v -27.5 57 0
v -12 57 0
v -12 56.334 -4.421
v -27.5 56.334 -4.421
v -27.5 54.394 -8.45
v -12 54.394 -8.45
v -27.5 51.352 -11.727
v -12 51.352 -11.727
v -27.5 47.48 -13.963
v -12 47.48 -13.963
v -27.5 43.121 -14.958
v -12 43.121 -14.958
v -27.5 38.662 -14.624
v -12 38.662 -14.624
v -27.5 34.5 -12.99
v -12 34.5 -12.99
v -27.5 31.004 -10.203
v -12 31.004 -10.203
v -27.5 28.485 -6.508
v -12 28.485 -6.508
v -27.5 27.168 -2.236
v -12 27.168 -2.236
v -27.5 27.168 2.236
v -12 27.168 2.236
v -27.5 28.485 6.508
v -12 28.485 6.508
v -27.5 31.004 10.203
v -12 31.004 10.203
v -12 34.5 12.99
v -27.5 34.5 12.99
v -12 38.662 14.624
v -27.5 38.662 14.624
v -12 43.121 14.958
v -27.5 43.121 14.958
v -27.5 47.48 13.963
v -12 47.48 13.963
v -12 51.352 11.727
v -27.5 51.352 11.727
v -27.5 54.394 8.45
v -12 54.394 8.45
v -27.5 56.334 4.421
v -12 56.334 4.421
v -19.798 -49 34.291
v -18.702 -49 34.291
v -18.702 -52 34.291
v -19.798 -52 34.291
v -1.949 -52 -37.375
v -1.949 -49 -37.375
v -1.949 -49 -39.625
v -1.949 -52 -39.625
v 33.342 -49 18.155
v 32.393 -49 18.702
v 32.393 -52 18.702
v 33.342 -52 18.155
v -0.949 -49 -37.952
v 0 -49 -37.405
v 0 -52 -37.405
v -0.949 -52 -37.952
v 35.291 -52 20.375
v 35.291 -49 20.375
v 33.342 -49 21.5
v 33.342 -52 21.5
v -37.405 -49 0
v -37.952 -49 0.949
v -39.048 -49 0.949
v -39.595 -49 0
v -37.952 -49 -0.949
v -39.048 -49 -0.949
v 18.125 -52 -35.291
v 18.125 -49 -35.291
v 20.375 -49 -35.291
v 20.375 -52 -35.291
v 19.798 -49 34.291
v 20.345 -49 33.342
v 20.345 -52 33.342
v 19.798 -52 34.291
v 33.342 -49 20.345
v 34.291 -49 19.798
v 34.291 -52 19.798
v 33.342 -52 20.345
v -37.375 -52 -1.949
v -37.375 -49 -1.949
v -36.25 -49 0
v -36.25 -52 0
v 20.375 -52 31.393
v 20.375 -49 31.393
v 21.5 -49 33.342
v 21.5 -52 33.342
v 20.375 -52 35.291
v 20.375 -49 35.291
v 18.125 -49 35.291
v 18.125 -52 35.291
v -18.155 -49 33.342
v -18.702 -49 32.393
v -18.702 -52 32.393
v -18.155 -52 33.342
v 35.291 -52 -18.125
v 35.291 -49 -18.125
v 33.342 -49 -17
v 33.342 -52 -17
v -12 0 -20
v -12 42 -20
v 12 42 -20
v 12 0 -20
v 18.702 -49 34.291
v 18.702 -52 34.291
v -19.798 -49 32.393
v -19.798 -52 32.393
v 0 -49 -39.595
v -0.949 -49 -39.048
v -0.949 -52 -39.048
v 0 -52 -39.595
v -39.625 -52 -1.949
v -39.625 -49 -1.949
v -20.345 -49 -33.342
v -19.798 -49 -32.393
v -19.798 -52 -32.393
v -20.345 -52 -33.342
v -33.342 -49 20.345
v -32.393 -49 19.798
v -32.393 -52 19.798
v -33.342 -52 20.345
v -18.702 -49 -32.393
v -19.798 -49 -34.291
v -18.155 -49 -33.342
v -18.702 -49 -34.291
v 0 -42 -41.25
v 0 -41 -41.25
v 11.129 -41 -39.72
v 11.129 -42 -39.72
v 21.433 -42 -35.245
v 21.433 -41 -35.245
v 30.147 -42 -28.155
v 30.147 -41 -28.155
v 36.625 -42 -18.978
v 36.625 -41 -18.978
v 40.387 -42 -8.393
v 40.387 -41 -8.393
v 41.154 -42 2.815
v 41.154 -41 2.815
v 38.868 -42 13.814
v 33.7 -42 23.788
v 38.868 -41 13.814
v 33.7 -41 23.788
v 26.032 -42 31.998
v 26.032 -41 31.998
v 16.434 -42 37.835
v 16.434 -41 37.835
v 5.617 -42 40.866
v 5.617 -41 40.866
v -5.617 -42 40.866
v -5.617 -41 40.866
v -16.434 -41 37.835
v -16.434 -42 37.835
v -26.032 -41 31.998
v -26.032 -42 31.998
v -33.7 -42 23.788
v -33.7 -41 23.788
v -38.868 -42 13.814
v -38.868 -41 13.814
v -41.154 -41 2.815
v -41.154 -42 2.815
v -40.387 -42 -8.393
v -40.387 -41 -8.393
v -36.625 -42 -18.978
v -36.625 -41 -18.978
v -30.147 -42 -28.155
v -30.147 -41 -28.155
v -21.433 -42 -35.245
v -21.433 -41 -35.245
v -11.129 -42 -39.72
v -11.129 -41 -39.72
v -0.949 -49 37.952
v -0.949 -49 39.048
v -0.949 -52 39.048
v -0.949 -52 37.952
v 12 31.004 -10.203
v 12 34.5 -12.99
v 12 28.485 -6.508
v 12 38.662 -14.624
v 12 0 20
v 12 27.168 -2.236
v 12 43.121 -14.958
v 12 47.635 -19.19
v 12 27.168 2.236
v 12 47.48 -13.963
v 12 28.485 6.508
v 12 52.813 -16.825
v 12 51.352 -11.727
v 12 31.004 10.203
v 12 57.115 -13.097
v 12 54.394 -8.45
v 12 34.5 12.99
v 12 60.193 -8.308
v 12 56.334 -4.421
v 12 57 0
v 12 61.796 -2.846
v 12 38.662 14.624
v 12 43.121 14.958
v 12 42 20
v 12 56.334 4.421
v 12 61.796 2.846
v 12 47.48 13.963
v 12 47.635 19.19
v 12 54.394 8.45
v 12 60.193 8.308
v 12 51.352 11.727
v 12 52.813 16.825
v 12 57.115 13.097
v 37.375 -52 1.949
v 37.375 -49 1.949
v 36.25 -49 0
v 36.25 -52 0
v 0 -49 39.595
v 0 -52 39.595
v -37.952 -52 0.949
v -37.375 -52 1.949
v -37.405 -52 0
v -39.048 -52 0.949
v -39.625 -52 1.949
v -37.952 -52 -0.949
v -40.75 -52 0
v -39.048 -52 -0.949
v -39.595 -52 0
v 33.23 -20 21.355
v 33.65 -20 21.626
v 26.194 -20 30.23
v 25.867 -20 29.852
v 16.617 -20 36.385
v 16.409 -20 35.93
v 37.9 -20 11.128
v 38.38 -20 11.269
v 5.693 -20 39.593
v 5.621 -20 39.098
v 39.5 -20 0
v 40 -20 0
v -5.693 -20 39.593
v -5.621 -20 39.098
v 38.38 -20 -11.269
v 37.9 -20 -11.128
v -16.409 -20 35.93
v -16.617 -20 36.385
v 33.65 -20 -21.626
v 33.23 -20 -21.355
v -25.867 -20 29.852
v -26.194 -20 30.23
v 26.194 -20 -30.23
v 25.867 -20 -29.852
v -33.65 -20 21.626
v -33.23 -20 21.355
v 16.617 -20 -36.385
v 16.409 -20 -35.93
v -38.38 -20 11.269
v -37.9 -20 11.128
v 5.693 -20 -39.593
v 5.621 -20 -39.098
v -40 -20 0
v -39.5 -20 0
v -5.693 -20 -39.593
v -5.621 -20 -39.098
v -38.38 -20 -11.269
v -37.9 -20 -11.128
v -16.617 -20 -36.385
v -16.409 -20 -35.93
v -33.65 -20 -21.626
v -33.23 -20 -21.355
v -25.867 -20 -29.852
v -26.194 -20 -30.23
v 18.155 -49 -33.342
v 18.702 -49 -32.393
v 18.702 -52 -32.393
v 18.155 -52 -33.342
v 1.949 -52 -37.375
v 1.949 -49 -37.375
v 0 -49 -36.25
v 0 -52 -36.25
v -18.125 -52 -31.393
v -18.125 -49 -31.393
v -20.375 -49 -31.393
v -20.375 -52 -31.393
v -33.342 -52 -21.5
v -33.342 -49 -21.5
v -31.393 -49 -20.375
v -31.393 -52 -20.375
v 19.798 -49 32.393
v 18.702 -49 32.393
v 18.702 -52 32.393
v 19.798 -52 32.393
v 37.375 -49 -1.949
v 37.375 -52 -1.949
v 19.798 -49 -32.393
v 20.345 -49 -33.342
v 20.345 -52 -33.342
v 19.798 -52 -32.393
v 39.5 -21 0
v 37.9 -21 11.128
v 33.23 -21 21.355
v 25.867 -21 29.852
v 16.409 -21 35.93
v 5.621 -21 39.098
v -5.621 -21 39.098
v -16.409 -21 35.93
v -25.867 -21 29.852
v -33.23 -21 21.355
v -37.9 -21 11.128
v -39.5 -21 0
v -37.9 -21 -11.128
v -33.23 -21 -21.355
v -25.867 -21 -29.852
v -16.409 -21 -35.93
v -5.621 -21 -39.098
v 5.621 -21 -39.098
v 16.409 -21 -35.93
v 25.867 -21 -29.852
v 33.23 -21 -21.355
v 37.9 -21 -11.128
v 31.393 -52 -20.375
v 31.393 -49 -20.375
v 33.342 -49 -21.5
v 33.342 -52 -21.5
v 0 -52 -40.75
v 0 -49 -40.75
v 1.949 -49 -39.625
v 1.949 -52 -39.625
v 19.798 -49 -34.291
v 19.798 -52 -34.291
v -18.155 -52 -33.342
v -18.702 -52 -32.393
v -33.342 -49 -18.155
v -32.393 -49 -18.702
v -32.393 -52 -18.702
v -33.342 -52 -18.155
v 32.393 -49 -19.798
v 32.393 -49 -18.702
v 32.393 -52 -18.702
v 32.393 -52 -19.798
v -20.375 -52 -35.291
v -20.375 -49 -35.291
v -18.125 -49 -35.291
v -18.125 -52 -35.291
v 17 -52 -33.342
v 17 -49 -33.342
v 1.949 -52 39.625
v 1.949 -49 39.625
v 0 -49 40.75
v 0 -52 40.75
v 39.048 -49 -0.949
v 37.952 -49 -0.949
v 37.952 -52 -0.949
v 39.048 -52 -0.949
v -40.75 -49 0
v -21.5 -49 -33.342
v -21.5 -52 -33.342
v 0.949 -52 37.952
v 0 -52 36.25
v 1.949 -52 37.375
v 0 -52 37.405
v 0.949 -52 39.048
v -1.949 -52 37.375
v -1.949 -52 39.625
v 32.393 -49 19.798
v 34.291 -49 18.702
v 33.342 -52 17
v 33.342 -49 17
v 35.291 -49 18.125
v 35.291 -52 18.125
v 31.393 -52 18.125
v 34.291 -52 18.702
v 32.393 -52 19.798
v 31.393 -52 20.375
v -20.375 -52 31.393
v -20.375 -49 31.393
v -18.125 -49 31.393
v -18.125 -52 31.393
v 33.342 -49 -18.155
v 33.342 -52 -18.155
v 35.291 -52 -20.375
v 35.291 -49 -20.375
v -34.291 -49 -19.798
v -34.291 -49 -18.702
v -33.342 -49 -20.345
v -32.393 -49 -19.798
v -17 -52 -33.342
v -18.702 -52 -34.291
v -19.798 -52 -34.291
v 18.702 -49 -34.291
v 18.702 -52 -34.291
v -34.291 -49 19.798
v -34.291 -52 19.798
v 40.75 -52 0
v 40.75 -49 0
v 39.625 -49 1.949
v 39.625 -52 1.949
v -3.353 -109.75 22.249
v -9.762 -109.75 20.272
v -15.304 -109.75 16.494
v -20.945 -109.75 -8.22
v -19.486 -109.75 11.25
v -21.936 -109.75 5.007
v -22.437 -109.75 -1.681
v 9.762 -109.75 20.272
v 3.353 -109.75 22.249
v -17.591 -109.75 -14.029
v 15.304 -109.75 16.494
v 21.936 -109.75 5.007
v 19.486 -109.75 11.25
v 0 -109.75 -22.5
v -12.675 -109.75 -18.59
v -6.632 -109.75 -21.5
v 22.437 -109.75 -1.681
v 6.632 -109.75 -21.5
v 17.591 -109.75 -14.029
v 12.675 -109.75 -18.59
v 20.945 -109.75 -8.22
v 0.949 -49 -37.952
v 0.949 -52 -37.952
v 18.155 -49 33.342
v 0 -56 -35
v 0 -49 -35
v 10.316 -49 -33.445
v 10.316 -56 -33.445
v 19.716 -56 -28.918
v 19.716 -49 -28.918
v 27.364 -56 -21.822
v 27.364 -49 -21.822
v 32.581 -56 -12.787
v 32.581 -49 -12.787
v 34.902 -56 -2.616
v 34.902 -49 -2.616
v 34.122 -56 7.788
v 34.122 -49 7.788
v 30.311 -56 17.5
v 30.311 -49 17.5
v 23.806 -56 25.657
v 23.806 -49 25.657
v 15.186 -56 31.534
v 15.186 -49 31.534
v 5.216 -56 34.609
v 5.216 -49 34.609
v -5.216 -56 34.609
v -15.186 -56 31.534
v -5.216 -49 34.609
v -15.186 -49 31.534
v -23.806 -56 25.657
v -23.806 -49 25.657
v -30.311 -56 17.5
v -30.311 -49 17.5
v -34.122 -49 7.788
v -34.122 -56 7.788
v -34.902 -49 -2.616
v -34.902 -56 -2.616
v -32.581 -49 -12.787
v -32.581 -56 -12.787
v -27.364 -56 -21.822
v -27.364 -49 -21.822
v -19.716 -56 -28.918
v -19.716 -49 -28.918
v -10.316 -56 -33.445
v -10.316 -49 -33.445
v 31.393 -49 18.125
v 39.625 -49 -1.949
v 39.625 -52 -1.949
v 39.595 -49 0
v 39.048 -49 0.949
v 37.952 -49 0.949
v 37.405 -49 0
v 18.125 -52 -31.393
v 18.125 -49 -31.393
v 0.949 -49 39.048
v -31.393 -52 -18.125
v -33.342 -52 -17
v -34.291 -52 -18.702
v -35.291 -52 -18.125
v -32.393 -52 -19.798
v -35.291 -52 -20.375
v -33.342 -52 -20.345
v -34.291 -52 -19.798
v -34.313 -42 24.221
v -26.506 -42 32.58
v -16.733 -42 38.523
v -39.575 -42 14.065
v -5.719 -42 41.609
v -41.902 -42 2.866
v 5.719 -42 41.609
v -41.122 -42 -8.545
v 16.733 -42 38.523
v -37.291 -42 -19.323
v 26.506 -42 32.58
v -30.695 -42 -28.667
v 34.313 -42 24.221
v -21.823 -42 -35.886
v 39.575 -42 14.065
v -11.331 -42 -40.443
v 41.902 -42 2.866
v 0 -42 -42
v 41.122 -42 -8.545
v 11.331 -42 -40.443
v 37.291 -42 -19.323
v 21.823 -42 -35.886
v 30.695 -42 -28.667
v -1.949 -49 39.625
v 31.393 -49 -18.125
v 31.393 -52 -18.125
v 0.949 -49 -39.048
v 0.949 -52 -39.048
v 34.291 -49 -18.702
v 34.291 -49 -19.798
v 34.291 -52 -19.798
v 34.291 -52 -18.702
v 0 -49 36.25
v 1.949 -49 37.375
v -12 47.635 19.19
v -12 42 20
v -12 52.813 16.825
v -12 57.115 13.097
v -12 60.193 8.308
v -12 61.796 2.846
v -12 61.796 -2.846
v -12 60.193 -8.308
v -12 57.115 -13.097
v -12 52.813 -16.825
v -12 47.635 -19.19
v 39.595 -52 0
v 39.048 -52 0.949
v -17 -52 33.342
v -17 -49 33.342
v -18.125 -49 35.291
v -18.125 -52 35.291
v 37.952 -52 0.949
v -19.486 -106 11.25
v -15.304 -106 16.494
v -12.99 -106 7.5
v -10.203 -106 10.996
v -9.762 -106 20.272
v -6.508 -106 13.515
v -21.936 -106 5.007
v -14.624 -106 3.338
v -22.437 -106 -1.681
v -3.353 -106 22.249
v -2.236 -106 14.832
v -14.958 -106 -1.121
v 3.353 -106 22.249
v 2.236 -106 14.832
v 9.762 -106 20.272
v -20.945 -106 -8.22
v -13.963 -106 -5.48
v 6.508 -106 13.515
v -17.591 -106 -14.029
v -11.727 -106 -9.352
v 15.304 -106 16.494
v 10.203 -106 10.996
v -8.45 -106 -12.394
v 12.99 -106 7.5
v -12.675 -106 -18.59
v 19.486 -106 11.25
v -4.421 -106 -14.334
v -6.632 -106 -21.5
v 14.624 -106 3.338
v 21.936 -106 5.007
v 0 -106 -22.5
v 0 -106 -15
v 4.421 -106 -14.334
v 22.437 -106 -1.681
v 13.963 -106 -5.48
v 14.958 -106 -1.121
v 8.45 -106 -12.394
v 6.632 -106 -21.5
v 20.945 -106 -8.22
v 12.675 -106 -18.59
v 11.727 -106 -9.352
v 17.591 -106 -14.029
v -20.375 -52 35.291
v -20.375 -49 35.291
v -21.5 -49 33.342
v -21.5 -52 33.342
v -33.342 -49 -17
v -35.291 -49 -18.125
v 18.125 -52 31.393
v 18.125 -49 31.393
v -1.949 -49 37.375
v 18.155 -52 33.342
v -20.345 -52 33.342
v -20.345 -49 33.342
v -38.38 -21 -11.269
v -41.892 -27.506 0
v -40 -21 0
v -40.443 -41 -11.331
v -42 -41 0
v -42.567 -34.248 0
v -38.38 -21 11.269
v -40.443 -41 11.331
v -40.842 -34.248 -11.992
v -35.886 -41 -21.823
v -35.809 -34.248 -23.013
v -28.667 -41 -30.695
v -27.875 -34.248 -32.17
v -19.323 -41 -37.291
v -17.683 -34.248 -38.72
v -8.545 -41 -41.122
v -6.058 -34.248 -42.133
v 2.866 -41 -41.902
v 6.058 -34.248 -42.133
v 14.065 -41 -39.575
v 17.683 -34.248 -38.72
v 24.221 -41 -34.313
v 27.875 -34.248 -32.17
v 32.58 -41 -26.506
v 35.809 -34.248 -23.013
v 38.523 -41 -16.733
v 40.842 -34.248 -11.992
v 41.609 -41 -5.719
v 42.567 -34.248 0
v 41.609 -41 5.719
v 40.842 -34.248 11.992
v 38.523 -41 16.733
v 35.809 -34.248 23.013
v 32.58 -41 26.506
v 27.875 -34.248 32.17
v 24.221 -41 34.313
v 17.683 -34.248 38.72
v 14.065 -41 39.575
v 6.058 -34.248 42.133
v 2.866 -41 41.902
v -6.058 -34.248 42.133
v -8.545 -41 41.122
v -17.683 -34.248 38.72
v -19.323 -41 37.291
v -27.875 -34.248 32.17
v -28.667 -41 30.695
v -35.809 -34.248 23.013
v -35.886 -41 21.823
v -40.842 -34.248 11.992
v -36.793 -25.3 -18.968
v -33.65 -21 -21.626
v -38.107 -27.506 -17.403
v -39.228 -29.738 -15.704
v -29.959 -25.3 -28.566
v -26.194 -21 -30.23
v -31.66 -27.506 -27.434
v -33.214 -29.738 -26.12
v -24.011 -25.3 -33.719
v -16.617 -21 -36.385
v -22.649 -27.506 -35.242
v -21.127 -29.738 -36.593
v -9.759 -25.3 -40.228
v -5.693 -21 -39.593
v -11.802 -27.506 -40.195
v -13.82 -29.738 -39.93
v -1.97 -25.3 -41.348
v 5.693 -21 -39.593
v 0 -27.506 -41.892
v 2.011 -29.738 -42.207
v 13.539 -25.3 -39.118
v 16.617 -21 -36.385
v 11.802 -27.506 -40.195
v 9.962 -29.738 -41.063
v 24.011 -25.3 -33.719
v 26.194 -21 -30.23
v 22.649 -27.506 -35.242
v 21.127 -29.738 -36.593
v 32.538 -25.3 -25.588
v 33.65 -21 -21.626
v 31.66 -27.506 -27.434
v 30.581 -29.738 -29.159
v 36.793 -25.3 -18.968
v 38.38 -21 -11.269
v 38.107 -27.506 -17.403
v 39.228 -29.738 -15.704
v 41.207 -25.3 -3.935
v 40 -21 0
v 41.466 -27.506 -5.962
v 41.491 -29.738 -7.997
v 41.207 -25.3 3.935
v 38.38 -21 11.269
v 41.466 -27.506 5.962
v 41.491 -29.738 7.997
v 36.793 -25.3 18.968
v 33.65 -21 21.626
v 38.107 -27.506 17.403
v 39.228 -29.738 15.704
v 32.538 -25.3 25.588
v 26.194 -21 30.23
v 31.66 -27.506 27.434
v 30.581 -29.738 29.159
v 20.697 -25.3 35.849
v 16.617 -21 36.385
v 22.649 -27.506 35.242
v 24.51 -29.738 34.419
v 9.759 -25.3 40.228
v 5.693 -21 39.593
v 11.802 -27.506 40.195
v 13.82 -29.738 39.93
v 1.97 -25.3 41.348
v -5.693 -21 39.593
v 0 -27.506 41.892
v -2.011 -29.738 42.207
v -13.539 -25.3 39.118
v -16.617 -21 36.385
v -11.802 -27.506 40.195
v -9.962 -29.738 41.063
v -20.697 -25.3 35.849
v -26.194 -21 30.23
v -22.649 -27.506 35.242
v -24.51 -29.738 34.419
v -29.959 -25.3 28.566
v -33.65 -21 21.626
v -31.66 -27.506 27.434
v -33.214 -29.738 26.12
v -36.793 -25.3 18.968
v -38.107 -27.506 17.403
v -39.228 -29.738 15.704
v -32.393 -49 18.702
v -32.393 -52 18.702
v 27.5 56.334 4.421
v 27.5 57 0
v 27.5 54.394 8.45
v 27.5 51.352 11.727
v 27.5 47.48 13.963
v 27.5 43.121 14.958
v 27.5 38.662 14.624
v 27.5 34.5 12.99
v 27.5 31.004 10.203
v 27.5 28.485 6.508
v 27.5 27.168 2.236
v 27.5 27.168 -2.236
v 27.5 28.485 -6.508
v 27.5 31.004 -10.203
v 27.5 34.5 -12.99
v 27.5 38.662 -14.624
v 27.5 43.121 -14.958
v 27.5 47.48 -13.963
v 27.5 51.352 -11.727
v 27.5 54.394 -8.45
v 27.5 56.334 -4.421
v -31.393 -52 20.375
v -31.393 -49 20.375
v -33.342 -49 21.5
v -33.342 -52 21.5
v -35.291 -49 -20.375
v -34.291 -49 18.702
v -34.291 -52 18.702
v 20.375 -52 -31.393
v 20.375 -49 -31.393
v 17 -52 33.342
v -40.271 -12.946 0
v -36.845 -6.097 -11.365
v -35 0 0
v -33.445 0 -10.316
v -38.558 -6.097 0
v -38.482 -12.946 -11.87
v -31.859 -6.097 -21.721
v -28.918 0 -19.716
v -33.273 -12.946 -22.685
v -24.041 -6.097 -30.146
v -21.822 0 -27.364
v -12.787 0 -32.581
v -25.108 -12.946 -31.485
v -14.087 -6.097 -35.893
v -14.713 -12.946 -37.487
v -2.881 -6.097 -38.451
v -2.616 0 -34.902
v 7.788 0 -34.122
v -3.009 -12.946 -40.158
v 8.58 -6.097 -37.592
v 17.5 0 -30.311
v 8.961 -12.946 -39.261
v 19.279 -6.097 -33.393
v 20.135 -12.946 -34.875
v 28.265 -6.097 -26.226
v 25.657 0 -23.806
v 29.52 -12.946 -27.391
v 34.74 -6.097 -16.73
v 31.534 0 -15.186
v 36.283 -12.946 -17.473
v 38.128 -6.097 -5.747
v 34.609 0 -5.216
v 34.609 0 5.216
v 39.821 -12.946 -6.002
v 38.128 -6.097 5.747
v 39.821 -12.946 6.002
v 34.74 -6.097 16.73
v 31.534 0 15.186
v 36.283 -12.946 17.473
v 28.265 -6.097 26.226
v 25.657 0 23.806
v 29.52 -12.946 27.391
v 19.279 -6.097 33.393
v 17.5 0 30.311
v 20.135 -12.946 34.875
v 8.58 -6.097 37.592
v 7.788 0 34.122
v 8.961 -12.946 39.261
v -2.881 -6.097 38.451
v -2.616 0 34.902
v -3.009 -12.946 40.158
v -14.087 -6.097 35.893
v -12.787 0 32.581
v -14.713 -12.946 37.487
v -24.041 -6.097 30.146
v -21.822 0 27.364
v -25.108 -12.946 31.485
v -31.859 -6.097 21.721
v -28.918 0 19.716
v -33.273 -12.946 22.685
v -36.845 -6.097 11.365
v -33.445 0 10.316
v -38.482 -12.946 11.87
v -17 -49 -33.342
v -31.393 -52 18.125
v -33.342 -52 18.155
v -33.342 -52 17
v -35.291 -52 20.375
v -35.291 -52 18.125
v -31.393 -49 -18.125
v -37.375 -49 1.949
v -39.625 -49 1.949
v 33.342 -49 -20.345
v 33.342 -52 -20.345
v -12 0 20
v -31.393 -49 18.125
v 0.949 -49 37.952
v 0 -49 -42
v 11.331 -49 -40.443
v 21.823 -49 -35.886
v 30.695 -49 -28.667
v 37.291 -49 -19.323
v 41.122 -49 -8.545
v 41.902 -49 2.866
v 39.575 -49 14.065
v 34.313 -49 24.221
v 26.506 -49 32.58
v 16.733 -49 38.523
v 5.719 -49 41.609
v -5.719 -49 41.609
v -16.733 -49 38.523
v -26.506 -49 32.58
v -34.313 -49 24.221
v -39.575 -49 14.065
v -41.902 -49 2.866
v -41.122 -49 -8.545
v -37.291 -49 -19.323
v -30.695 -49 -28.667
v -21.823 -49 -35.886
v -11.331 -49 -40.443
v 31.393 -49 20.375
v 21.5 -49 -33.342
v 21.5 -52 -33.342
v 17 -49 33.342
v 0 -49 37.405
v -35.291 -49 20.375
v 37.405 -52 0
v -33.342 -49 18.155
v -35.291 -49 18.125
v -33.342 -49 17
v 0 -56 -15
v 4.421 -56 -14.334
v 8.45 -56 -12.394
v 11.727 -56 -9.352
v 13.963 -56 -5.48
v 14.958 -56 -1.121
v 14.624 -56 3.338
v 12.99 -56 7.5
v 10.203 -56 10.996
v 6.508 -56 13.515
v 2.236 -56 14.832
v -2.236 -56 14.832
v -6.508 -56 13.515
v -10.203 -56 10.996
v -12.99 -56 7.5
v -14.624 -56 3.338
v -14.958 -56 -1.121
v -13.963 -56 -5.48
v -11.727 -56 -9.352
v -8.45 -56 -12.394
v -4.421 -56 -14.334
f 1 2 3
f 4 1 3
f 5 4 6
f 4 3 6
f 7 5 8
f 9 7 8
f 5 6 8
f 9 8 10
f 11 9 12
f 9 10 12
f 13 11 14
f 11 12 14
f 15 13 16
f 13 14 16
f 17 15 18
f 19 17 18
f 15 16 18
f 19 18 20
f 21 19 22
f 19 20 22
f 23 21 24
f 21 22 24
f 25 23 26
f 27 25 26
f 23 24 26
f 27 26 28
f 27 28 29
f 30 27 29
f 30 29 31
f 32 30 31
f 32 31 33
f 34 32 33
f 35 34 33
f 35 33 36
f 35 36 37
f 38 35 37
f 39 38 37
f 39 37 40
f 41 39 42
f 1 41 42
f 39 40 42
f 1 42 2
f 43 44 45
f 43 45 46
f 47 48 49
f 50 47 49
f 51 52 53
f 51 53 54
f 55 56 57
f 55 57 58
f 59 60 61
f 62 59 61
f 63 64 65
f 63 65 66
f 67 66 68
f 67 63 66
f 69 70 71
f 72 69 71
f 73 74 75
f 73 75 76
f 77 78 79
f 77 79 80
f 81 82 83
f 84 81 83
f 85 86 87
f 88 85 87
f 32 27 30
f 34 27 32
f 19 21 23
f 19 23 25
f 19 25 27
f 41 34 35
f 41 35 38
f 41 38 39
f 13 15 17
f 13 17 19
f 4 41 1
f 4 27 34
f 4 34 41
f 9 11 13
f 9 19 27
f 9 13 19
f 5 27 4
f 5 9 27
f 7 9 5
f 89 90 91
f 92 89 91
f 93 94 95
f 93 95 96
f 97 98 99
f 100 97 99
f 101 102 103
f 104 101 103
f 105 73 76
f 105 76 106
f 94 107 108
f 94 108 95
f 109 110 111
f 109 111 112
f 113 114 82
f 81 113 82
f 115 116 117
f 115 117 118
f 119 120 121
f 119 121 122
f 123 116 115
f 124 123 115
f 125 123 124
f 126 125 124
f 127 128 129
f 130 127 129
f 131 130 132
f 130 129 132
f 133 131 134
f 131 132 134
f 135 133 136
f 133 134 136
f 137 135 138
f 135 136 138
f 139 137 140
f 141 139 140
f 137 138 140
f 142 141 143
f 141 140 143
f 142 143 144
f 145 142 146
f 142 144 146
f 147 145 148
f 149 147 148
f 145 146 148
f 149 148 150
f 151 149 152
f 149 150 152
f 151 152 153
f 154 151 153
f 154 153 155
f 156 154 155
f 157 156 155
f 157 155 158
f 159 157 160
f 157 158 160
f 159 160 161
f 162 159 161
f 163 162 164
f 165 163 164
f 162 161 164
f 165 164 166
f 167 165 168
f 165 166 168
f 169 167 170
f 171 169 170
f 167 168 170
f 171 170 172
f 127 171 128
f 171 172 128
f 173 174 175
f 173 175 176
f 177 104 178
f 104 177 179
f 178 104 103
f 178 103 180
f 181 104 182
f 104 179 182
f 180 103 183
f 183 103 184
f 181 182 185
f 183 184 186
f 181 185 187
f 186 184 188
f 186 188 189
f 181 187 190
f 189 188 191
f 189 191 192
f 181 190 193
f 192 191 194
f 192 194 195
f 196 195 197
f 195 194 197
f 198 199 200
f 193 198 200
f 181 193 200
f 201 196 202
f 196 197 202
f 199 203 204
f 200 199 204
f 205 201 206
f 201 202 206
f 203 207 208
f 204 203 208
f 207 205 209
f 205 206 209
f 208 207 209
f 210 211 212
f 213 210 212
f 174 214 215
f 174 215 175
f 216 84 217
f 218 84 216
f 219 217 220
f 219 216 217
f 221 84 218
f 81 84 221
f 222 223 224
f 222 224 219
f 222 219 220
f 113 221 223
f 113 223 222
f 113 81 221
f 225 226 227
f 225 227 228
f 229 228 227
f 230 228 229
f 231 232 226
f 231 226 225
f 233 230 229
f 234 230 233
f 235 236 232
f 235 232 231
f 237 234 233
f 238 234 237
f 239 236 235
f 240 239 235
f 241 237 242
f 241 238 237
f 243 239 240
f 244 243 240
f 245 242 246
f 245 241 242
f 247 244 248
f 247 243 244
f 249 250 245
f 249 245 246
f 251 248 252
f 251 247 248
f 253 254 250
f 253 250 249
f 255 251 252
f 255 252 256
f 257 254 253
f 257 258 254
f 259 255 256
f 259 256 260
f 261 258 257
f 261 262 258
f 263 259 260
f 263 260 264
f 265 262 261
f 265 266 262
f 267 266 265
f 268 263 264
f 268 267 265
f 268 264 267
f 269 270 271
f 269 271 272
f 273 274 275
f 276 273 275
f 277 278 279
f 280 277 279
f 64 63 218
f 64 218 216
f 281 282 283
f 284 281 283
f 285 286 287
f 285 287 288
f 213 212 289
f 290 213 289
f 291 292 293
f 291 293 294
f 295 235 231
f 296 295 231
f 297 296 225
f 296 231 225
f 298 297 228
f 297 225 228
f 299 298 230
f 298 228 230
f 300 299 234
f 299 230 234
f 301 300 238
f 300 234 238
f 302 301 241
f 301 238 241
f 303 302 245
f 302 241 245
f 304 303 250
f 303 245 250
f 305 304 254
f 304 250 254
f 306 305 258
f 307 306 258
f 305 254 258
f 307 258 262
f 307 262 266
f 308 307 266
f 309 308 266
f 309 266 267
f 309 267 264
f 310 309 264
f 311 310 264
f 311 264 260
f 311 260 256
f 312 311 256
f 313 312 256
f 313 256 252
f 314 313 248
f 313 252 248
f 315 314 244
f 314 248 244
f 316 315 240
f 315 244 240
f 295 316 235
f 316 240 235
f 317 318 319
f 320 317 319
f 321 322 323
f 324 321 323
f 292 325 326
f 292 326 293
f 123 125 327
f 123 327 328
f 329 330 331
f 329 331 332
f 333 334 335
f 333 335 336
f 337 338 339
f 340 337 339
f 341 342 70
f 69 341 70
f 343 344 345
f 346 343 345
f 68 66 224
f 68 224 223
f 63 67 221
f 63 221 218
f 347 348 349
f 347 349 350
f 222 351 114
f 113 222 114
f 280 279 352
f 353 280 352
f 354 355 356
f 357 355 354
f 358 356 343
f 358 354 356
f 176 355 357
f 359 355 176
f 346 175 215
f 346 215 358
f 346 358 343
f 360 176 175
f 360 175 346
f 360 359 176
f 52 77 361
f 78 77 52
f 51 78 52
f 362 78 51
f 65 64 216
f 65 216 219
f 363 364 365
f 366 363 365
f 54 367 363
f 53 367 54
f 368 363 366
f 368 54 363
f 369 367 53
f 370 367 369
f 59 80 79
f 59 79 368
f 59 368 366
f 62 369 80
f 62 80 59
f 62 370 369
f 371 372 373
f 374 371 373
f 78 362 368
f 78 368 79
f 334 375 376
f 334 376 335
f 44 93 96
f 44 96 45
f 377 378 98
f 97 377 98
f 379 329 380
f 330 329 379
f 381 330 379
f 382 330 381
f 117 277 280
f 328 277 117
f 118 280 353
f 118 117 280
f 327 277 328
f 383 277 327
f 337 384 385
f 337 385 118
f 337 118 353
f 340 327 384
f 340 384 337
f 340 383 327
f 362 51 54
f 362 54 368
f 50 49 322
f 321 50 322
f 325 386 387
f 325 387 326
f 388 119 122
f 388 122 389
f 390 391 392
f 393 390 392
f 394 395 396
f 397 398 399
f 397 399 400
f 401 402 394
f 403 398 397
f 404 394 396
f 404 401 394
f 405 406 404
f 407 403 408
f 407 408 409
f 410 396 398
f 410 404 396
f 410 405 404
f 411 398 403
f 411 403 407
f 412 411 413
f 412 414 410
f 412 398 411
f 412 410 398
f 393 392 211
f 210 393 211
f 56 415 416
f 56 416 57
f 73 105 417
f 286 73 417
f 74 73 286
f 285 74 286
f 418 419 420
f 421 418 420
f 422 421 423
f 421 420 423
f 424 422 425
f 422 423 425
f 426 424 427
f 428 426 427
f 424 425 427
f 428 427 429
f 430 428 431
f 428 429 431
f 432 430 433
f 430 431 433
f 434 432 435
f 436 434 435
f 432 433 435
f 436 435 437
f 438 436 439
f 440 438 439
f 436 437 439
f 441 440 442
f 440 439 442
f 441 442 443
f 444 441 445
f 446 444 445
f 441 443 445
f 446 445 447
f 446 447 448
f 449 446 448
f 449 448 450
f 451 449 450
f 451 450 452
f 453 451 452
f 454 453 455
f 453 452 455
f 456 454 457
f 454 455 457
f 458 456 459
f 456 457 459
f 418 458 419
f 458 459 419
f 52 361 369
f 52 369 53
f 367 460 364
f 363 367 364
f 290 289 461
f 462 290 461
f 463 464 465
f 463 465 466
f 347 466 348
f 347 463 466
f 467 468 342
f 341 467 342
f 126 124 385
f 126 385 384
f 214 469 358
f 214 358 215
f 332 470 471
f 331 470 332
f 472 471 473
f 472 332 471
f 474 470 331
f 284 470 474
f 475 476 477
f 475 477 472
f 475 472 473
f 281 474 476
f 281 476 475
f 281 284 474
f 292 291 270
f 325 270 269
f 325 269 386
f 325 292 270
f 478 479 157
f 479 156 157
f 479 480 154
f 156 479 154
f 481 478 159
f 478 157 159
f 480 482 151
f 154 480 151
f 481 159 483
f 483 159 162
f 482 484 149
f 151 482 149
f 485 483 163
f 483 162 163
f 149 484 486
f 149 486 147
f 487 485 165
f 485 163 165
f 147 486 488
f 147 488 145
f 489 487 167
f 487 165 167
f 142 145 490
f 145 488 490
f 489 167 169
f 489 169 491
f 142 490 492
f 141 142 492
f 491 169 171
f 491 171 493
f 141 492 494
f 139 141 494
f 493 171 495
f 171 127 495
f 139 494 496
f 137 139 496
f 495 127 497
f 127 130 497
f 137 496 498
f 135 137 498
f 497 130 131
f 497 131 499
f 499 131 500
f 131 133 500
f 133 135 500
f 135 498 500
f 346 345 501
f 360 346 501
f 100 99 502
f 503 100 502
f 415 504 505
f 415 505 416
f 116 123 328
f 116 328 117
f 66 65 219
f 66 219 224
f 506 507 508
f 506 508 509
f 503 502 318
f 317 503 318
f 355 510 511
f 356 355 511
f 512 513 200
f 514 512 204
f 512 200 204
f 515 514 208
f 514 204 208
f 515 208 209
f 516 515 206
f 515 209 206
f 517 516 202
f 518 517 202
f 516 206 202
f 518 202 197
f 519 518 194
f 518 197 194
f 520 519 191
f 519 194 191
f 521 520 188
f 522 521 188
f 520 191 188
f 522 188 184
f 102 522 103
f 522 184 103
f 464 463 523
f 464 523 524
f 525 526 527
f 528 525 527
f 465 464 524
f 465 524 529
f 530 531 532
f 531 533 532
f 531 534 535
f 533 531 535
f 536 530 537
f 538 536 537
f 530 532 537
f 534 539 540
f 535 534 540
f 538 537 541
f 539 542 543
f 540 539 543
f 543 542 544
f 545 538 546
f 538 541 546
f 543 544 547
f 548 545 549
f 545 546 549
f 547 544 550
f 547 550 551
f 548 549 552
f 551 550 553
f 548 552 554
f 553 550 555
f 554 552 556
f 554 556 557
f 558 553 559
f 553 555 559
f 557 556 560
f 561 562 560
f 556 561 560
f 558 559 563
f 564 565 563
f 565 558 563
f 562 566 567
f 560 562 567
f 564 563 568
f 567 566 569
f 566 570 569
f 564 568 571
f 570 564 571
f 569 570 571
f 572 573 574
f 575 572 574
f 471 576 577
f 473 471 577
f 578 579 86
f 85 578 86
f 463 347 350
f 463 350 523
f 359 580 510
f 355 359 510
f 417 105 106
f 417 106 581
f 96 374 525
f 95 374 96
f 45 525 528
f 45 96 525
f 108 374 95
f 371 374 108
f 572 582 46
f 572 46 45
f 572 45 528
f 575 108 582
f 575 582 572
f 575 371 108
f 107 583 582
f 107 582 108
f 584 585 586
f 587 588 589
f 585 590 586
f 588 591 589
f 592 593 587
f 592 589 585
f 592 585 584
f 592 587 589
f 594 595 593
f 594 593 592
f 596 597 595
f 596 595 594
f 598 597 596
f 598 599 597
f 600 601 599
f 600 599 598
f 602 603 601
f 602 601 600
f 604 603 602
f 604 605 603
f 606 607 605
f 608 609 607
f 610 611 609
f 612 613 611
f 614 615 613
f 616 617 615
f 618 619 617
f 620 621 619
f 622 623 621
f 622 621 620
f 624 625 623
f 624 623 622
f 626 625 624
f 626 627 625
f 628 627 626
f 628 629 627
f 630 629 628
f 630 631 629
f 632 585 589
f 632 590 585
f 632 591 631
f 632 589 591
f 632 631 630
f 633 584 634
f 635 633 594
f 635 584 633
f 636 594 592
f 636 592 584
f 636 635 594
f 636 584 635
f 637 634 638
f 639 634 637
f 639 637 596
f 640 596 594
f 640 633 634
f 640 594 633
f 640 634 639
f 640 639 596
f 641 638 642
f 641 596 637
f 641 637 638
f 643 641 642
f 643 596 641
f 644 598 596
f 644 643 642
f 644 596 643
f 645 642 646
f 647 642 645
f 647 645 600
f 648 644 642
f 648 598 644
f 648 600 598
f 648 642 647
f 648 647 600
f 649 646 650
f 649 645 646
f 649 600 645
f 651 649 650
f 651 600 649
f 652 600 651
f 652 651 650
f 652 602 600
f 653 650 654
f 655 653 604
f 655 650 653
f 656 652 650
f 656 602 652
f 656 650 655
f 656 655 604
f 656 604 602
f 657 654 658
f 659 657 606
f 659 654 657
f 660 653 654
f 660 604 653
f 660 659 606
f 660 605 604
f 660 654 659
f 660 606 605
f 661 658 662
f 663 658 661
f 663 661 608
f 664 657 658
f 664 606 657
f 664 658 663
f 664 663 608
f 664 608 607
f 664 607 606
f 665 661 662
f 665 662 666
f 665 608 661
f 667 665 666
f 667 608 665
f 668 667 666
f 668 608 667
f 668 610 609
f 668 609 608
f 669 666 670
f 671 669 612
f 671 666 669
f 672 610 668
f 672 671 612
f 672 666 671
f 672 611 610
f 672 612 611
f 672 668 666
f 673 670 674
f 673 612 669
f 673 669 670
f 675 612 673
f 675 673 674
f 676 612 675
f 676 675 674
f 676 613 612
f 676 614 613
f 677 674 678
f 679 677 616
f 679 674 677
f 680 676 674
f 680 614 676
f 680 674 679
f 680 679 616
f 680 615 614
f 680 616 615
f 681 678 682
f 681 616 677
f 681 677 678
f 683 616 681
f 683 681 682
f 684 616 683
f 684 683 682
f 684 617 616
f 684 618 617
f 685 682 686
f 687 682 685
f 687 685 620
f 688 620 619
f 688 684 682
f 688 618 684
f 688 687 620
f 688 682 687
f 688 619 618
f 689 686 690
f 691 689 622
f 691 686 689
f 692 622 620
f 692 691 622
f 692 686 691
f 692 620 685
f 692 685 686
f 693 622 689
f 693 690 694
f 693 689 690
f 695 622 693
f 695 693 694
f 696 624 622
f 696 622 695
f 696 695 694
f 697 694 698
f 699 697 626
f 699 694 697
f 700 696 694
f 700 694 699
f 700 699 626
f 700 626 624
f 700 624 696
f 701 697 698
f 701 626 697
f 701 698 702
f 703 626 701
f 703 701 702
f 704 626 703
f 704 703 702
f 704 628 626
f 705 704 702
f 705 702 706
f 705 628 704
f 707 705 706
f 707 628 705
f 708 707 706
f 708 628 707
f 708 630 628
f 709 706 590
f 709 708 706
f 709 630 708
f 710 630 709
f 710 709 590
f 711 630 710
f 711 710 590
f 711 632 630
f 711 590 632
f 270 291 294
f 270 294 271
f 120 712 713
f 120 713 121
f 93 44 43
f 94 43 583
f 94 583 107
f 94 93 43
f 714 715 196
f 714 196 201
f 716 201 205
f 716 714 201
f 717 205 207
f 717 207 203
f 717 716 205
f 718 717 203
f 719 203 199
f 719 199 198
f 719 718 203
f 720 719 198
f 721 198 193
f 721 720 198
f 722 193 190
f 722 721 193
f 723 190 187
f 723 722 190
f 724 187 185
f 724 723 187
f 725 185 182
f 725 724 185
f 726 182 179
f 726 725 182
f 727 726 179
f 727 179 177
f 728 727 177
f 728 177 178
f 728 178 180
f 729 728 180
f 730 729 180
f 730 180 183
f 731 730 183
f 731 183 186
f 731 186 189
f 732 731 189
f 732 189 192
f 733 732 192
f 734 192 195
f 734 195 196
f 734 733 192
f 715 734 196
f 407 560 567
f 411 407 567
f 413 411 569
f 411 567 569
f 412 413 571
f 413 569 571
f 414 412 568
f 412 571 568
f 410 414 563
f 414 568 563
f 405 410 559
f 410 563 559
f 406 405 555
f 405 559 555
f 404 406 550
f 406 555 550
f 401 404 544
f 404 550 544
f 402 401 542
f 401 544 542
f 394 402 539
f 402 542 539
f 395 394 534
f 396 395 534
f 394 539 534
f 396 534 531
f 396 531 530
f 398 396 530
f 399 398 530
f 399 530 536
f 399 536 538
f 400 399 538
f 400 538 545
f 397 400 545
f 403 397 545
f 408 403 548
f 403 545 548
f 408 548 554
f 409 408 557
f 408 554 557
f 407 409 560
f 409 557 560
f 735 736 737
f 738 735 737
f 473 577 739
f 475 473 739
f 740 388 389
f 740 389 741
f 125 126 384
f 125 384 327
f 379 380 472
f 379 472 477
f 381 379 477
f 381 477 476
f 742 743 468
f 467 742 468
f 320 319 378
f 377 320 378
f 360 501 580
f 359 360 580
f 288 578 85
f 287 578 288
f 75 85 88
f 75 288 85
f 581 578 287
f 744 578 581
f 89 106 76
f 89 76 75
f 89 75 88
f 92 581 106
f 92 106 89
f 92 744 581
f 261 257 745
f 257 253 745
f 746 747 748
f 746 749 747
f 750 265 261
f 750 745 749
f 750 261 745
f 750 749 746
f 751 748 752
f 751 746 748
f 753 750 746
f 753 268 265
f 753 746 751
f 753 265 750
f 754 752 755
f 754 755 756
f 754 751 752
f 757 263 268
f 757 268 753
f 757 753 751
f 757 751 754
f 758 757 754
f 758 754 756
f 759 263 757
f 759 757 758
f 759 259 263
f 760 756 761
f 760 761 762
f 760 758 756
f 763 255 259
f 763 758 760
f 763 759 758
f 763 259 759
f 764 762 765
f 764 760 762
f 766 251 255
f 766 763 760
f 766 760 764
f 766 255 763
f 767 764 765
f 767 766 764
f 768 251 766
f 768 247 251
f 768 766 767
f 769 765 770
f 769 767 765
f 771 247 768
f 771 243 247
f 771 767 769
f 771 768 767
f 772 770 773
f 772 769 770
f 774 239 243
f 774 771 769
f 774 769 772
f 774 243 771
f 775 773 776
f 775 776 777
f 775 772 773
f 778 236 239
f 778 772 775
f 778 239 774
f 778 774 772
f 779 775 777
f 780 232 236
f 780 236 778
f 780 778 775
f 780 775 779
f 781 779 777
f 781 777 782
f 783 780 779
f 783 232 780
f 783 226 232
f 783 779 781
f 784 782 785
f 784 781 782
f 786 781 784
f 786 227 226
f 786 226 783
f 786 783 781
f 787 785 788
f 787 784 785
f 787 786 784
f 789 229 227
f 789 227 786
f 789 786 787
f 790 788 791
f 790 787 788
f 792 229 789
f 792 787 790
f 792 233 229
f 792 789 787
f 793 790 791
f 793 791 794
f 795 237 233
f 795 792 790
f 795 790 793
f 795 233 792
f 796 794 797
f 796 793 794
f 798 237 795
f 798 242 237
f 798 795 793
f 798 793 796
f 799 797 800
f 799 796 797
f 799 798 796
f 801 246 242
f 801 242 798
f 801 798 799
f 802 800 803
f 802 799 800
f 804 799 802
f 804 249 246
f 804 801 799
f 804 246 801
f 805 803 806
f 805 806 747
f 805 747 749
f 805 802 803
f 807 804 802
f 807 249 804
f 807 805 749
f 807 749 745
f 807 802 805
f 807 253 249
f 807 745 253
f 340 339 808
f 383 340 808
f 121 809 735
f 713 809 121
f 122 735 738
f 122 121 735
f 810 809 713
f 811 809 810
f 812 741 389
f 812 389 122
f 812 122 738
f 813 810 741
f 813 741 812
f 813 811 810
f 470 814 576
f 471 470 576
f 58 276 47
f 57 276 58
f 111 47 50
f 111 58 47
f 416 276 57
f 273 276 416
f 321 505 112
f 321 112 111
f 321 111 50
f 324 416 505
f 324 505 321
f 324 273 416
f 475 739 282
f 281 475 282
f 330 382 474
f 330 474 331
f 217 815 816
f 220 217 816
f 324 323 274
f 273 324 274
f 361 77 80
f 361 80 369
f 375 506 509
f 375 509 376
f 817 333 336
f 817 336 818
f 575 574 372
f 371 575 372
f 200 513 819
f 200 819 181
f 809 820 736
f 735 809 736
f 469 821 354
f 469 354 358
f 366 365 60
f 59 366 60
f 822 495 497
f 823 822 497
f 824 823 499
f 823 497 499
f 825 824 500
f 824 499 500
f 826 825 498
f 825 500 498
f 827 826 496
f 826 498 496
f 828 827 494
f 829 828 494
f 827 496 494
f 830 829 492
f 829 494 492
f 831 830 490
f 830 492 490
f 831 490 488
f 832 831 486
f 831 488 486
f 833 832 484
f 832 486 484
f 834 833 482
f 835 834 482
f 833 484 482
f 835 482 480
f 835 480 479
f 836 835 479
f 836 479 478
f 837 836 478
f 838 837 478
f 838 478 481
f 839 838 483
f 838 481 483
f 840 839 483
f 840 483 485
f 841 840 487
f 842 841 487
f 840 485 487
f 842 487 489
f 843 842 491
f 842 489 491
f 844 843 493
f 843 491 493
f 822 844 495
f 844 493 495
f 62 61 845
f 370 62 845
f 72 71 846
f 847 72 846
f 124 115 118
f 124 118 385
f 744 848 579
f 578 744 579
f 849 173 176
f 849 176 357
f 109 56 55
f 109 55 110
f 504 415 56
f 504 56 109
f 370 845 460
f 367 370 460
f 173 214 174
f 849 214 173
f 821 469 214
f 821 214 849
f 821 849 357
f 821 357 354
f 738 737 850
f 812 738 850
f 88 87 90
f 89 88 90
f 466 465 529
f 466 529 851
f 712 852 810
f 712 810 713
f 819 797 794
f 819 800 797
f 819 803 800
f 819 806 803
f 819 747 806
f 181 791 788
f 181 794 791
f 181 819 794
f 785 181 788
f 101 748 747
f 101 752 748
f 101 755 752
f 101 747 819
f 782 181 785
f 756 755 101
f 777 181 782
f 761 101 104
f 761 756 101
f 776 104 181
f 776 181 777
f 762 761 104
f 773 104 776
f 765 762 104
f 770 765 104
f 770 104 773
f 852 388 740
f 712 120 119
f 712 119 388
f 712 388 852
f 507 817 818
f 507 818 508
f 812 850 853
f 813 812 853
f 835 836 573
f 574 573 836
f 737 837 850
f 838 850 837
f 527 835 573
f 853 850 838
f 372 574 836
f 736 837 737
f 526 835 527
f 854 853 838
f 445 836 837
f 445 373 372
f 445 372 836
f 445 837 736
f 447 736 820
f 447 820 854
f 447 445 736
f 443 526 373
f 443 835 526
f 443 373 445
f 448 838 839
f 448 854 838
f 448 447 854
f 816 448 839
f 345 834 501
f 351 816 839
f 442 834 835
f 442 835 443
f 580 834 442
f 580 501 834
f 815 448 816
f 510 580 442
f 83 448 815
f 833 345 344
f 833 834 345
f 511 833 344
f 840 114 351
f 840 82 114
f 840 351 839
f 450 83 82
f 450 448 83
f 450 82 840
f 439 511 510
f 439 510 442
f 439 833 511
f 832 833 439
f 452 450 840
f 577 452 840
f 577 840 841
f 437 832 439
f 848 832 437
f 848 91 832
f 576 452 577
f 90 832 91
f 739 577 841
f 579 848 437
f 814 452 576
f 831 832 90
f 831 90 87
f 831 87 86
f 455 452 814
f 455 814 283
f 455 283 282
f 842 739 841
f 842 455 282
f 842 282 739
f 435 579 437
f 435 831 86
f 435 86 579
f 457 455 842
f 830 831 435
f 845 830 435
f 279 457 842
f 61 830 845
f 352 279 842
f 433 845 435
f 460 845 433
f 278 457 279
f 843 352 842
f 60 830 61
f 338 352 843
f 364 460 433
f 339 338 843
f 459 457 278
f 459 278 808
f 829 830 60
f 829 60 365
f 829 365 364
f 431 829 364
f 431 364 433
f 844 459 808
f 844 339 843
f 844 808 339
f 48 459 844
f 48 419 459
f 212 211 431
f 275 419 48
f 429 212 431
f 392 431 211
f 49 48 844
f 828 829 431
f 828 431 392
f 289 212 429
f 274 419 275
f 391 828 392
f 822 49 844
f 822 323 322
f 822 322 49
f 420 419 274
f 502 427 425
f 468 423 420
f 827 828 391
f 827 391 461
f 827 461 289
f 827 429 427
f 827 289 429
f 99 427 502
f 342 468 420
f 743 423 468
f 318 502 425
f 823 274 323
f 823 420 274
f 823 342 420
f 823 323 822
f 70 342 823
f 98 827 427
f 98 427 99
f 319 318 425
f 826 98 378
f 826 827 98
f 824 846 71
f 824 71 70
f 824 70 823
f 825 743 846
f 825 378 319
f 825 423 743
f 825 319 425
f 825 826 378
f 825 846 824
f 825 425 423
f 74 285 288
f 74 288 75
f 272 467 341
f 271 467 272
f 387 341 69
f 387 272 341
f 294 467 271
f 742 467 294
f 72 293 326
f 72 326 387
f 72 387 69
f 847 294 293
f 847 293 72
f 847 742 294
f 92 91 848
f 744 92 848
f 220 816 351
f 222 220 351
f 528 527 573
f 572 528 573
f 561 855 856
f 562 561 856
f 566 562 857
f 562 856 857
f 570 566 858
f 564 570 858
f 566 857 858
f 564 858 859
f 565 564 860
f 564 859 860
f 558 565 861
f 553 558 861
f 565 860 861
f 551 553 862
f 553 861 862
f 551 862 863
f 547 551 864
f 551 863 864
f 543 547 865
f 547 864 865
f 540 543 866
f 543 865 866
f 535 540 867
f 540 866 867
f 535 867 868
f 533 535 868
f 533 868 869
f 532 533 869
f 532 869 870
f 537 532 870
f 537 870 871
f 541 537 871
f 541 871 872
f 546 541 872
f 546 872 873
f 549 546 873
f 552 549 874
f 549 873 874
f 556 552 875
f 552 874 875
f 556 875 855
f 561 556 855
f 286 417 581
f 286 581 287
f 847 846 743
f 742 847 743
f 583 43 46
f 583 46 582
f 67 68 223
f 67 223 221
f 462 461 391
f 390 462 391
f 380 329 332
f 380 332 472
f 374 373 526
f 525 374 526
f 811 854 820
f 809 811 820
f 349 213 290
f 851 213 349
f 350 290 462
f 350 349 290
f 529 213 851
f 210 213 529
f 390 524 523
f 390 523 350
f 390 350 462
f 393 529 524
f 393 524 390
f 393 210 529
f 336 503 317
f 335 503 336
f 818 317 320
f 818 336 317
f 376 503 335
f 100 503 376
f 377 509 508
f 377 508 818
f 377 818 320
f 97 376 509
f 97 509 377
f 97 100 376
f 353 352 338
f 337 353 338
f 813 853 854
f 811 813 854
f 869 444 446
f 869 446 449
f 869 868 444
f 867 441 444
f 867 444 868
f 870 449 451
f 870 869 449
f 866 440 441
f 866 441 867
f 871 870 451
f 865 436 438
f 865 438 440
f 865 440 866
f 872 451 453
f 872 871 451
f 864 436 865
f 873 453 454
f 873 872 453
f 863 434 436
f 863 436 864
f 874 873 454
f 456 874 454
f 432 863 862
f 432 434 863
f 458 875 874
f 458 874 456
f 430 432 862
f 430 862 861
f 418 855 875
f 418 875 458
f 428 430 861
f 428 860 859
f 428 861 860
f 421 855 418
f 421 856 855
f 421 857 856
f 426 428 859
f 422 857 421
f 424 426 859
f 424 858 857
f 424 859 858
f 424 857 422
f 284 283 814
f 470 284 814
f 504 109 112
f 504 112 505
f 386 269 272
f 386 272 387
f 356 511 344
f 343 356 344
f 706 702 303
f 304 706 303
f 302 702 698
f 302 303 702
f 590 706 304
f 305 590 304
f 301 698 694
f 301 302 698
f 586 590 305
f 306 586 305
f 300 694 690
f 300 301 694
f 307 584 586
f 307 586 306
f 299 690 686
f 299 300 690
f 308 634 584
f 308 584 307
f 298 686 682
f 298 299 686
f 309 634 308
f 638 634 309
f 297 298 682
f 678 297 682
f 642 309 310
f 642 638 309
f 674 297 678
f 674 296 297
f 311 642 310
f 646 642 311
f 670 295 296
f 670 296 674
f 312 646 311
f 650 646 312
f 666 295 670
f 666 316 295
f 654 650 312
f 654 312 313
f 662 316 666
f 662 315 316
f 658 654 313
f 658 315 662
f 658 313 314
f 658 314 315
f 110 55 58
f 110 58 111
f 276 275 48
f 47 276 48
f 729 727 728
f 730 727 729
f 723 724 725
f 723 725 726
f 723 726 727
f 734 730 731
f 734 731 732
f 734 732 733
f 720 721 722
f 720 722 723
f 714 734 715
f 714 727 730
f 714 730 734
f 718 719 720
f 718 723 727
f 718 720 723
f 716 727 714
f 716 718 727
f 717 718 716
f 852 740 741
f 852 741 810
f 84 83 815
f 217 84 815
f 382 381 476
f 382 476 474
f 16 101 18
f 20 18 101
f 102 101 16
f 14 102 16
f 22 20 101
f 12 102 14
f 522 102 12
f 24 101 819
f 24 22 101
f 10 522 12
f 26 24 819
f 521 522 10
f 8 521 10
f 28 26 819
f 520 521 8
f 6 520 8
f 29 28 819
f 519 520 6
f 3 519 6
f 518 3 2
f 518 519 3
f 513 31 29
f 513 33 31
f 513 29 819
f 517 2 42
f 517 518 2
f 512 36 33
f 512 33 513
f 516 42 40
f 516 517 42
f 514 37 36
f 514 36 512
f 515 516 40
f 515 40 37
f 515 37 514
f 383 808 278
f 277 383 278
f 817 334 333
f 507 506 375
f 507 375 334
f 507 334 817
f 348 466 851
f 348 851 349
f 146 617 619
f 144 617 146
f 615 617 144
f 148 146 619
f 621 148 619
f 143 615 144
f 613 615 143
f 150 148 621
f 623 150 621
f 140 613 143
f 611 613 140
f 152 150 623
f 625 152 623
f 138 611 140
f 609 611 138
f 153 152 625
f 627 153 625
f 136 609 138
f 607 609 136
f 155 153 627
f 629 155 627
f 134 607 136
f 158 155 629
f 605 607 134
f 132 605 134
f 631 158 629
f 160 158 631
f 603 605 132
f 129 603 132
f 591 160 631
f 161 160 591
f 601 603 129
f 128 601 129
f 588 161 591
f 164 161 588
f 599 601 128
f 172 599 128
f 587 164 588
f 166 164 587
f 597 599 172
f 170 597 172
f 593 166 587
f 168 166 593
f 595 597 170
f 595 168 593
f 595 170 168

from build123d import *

# Parameters (mm, degrees)
SKETCH2_R            = 39.5
BOSS_EXTRUDE1_DEPTH  = 1
SKETCH4_R            = 41.25
BOSS_EXTRUDE2_DEPTH  = 1
SKETCH5_R            = 42
BOSS_EXTRUDE3_DEPTH  = 7
SKETCH6_R            = 35
BOSS_EXTRUDE4_DEPTH  = 7
BOSS_EXTRUDE7_DEPTH  = 3
CIRPATTERN2_COUNT    = 12
SKETCH8_R            = 15
BOSS_EXTRUDE8_DEPTH  = 50
SKETCH9_W            = 24
SKETCH9_H            = 40
BOSS_EXTRUDE9_DEPTH  = 42
BOSS_EXTRUDE10_START = -24
BOSS_EXTRUDE10_DEPTH = 24
SKETCH11_R           = 15
BOSS_EXTRUDE11_DEPTH = 15.5
BOSS_EXTRUDE12_START = 15.5
SKETCH12_R           = 15
BOSS_EXTRUDE12_DEPTH = 15.5
SKETCH13_R           = 22.5
BOSS_EXTRUDE13_DEPTH = 3.75


with BuildPart() as part:
    # Sketch1 → Revolve1 (revolve)
    with BuildSketch(Plane.XY):
        with BuildLine():
            Line((0, 0), (-35, 0))
            ThreePointArc((-35, 0), (-39.657515479, -9.46062113), (-40, -20))
            Line((-40, -20), (0, -20))
            Line((0, -20), (0, 0))
        make_face()
    revolve(axis=Axis((0, 0, 0), (0, -1, 0)))

    # Sketch2 → Boss-Extrude1 (add)
    with BuildSketch(Plane.XZ.offset(20)):
        Circle(SKETCH2_R)
    extrude(amount=BOSS_EXTRUDE1_DEPTH)

    # Sketch3 → Revolve2 (revolve)
    with BuildSketch(Plane(origin=(0, 0, 0), x_dir=(0, 0, -1), z_dir=(1, 0, 0)), mode=Mode.PRIVATE) as revolve2_sk:
        with BuildLine():
            Line((0, -21), (-40, -21))
            ThreePointArc((-40, -21), (-42.384109041, -30.861589096), (-42, -41))
            Line((-42, -41), (0, -41))
            Line((0, -41), (0, -21))
        make_face()
    revolve(revolve2_sk.sketch.rotate(Axis((0, -21, 0), (0, -1, 0)), 90), axis=Axis((0, -21, 0), (0, -1, 0)))

    # Sketch4 → Boss-Extrude2 (add)
    with BuildSketch(Plane.XZ.offset(41)):
        with Locations(Location((0, 0, 0), (0, 0, 270))):
            Circle(SKETCH4_R)
    extrude(amount=BOSS_EXTRUDE2_DEPTH)

    # Sketch5 → Boss-Extrude3 (add)
    with BuildSketch(Plane.XZ.offset(42)):
        with Locations(Location((0, 0, 0), (0, 0, 270))):
            Circle(SKETCH5_R)
    extrude(amount=BOSS_EXTRUDE3_DEPTH)

    # Sketch6 → Boss-Extrude4 (add)
    with BuildSketch(Plane.XZ.offset(49)):
        with Locations(Location((0, 0, 0), (0, 0, 270))):
            Circle(SKETCH6_R)
    extrude(amount=BOSS_EXTRUDE4_DEPTH)

    # Sketch7 → Boss-Extrude7 (add)
    with BuildSketch(Plane.XZ.offset(49)):
        Polygon((40.75, 0), (39.625, 1.948557159), (37.375, 1.948557159), (36.25, 0), (37.375, -1.948557159), (39.625, -1.948557159), align=None)
        Polygon((39.047649731, 0.948557159), (37.952350269, 0.948557159), (37.404700538, 0), (37.952350269, -0.948557159), (39.047649731, -0.948557159), (39.595299462, 0), align=None, mode=Mode.SUBTRACT)
    boss_extrude7 = extrude(amount=BOSS_EXTRUDE7_DEPTH)

    # CirPattern2: Boss-Extrude7 ×12 about axis
    cirpattern2_axis = Axis((0, 0, 0), (0, 1, 0))
    for i in range(1, CIRPATTERN2_COUNT):
        add(boss_extrude7.rotate(cirpattern2_axis, i * 360 / CIRPATTERN2_COUNT))

    # Sketch8 → Boss-Extrude8 (add)
    with BuildSketch(Plane.XZ.offset(56)):
        with Locations(Location((0, 0, 0), (0, 0, 270))):
            Circle(SKETCH8_R)
    extrude(amount=BOSS_EXTRUDE8_DEPTH)

    # Sketch9 → Boss-Extrude9 (add)
    with BuildSketch(Plane(origin=(0, 0, 0), x_dir=(1, 0, 0), z_dir=(0, 1, 0))):
        Rectangle(SKETCH9_W, SKETCH9_H)
    extrude(amount=BOSS_EXTRUDE9_DEPTH)

    # Sketch10 → Boss-Extrude10 (add)
    with BuildSketch(Plane.ZY.offset(12).offset(BOSS_EXTRUDE10_START)):
        with BuildLine():
            Line((-20, 42), (20, 42))
            ThreePointArc((20, 42), (0, 62), (-20, 42))
        make_face()
    extrude(amount=BOSS_EXTRUDE10_DEPTH)

    # Sketch11 → Boss-Extrude11 (add)
    with BuildSketch(Plane.ZY.offset(12)):
        with Locations(Location((0, 42, 0), (0, 0, 90))):
            Circle(SKETCH11_R)
    extrude(amount=BOSS_EXTRUDE11_DEPTH)

    # Sketch12 → Boss-Extrude12 (add)
    with BuildSketch(Plane(origin=(12, 0, 0), x_dir=(0, 0, -1), z_dir=(1, 0, 0)).offset(BOSS_EXTRUDE12_START)):
        with Locations(Location((0, 42, 0), (0, 0, 90))):
            Circle(SKETCH12_R)
    extrude(amount=-BOSS_EXTRUDE12_DEPTH)

    # Sketch13 → Boss-Extrude13 (add)
    with BuildSketch(Plane.XZ.offset(106)):
        with Locations(Location((0, 0, 0), (0, 0, 270))):
            Circle(SKETCH13_R)
    extrude(amount=BOSS_EXTRUDE13_DEPTH)


solid = part.part
